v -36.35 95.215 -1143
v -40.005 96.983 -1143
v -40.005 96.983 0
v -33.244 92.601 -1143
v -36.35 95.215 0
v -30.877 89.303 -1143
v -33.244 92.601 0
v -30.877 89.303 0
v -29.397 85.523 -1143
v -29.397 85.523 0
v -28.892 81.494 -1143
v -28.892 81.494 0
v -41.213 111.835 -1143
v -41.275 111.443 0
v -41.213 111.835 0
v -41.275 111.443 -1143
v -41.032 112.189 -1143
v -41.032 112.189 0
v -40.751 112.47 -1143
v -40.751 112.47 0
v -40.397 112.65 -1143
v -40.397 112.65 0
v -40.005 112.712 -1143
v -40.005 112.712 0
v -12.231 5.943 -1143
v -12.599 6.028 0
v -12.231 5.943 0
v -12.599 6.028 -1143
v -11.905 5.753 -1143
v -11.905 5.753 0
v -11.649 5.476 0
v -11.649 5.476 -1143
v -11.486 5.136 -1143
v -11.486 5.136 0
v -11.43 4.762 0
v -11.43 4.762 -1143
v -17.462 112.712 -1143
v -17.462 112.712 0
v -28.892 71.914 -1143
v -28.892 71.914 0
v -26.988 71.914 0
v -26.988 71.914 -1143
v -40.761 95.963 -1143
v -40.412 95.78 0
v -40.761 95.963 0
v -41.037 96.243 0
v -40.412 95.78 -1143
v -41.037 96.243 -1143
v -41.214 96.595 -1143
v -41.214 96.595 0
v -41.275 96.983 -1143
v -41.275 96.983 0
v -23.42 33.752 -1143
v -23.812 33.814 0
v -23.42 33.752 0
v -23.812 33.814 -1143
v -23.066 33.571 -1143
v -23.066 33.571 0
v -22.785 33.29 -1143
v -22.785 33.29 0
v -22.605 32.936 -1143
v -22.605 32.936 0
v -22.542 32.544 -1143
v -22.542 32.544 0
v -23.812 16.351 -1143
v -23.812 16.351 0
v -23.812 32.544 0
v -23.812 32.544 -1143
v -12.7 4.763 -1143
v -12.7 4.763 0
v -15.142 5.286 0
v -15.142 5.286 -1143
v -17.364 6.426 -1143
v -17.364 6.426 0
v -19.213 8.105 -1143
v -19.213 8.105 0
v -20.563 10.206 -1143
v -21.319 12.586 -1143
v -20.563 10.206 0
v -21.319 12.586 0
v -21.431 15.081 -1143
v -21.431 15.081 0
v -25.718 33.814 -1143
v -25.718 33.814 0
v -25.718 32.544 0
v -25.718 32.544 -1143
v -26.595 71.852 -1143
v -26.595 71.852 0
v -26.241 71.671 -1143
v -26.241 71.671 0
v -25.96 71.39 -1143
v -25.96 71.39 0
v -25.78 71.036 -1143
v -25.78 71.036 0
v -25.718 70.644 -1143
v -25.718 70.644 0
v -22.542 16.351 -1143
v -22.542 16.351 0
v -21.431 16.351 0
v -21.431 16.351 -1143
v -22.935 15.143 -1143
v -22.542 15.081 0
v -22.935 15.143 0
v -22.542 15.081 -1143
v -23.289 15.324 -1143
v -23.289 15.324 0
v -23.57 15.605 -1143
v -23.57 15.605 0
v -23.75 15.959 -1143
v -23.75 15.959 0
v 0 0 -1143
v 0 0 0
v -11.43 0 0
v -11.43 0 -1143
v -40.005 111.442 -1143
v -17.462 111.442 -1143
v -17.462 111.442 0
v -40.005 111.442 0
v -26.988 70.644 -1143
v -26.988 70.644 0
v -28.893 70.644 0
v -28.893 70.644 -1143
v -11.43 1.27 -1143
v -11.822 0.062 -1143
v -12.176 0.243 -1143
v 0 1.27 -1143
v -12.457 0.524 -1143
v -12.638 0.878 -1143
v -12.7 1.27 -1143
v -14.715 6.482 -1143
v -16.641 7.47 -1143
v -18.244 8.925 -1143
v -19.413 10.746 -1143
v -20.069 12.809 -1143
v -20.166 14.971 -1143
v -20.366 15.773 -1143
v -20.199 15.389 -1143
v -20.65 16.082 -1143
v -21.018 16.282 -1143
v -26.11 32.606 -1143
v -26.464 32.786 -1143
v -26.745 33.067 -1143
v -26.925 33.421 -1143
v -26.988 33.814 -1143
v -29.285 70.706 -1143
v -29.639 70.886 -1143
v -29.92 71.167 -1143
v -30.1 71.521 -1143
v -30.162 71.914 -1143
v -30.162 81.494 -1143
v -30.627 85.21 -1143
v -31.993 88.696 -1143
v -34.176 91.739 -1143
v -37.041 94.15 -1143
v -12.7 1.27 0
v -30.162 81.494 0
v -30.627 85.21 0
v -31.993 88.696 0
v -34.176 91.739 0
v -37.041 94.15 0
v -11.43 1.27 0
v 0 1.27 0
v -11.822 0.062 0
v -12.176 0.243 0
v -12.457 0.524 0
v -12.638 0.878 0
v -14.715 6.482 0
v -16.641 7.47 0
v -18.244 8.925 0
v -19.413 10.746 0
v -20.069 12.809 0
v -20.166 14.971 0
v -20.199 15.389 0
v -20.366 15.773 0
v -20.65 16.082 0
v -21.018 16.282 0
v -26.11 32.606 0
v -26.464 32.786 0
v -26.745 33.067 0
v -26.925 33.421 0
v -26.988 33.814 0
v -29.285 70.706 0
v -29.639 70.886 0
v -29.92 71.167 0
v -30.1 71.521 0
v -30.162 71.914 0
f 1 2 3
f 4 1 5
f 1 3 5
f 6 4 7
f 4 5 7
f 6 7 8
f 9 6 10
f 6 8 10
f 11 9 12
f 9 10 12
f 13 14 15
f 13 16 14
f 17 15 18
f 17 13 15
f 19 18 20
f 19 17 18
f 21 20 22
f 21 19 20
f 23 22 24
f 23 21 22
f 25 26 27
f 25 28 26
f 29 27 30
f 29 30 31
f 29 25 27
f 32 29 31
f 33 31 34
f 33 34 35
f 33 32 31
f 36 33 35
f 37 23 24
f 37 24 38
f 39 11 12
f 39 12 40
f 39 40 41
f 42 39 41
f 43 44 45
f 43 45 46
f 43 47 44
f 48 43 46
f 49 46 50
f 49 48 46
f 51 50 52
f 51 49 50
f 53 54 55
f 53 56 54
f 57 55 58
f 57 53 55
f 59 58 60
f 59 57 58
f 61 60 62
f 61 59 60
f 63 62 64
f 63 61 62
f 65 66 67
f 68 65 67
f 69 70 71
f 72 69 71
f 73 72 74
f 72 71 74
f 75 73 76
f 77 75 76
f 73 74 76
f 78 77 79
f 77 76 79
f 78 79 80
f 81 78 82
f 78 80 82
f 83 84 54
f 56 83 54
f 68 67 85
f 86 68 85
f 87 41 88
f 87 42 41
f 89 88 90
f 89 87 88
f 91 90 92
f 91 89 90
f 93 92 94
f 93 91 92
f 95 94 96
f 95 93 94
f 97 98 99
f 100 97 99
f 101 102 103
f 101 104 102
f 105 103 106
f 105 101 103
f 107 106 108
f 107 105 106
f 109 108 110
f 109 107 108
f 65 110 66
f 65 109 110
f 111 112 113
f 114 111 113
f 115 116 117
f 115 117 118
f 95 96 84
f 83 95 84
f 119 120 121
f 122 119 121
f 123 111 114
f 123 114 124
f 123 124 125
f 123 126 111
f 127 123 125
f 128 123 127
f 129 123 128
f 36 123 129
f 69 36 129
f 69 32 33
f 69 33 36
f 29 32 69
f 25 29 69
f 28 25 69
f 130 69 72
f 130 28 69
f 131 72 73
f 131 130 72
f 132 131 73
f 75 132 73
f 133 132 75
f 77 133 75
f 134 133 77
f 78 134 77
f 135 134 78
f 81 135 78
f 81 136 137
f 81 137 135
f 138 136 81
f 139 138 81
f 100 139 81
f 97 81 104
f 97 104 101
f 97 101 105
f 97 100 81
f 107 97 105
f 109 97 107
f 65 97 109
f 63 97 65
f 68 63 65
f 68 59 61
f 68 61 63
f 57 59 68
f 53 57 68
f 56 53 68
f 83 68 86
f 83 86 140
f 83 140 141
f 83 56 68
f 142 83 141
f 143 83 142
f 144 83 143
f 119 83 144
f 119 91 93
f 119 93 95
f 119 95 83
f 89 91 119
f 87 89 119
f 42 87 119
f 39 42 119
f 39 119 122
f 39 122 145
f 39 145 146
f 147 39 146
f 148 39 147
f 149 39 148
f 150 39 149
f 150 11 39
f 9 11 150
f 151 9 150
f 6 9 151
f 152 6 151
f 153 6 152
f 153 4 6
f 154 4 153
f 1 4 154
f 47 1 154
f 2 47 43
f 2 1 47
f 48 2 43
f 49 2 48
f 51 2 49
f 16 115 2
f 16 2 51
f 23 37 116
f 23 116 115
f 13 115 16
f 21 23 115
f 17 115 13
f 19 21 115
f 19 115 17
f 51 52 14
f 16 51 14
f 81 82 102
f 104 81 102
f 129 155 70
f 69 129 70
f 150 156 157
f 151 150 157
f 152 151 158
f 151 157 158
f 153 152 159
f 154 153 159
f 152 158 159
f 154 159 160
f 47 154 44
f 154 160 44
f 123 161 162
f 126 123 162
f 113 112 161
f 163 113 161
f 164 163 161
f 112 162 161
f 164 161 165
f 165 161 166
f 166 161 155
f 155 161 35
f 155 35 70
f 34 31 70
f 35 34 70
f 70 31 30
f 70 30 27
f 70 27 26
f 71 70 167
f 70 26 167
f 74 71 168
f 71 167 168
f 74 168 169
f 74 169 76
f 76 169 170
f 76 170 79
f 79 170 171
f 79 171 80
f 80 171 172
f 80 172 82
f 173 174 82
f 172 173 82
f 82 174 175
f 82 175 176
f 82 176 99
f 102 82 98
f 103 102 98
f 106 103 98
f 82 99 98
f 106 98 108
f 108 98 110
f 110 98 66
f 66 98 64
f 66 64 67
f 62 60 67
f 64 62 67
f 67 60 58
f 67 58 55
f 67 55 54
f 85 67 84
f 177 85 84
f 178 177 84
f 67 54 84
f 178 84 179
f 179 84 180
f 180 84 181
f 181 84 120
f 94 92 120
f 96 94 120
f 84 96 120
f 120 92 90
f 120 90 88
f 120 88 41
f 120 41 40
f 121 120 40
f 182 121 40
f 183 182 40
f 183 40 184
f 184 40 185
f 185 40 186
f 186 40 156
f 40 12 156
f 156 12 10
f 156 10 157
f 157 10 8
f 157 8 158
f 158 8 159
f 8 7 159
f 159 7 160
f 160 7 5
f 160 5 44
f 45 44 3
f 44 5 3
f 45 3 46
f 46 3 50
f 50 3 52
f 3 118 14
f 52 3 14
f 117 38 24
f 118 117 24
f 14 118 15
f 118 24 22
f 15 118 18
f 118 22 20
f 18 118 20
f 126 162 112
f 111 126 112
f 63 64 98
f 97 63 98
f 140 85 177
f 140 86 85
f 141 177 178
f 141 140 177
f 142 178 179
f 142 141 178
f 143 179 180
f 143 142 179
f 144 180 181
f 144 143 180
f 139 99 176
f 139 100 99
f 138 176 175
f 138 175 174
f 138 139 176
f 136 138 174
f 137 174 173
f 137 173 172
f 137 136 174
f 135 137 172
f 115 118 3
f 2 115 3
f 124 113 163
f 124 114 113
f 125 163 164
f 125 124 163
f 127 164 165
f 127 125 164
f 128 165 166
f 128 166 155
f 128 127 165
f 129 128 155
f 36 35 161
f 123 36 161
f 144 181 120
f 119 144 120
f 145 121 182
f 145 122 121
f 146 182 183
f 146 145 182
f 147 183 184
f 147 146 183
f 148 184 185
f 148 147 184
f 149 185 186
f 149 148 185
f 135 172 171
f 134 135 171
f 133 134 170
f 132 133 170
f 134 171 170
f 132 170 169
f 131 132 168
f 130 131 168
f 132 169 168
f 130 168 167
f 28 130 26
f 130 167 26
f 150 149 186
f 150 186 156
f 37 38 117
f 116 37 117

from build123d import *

# Parameters (mm, degrees)
EXTRUDE_THIN1_DEPTH = 1143
FILLET1_R           = 1.27


with BuildPart() as part:
    # Sketch1 → Extrude-Thin1 (new body)
    with BuildSketch(Plane.XY):
        with BuildLine():
            Line((0, 0), (-12.7, 0))
            Line((-12.7, 0), (-12.7, 4.7625))
            ThreePointArc((-12.7, 4.7625), (-19.213209814, 8.104687849), (-21.43125, 15.08125))
            Line((-21.43125, 15.08125), (-23.8125, 15.08125))
            Line((-23.8125, 15.08125), (-23.8125, 32.54375))
            Line((-23.8125, 32.54375), (-26.9875, 32.54375))
            Line((-26.9875, 32.54375), (-26.9875, 70.64375))
            Line((-26.9875, 70.64375), (-30.1625, 70.64375))
            Line((-30.1625, 70.64375), (-30.1625, 81.494072169))
            ThreePointArc((-30.1625, 81.494072169), (-33.258387834, 90.648043728), (-41.275, 96.04375))
            Line((-41.275, 96.04375), (-41.275, 112.7125))
            Line((-41.275, 112.7125), (-17.4625, 112.7125))
            Line((-17.4625, 112.7125), (-17.4625, 111.4425))
            Line((-17.4625, 111.4425), (-40.005, 111.4425))
            Line((-40.005, 111.4425), (-40.005, 96.983387034))
            ThreePointArc((-40.005, 96.983387034), (-31.95797777, 91.025684457), (-28.8925, 81.494072169))
            Line((-28.8925, 81.494072169), (-28.8925, 71.91375))
            Line((-28.8925, 71.91375), (-25.7175, 71.91375))
            Line((-25.7175, 71.91375), (-25.7175, 33.81375))
            Line((-25.7175, 33.81375), (-22.5425, 33.81375))
            Line((-22.5425, 33.81375), (-22.5425, 16.35125))
            Line((-22.5425, 16.35125), (-19.926963078, 16.35125))
            ThreePointArc((-19.926963078, 16.35125), (-18.318060907, 9.014168003), (-11.43, 6.018178122))
            Line((-11.43, 6.018178122), (-11.43, 1.27))
            Line((-11.43, 1.27), (0, 1.27))
            Line((0, 1.27), (0, 0))
        make_face()
    extrude(amount=-EXTRUDE_THIN1_DEPTH)

    # Fillet1
    fillet1_edges = [part.edges().sort_by_distance(p)[0] for p in [
        (-25.7175, 71.91375, -571.5),
        (-22.5425, 33.81375, -571.5),
        (-19.926963078, 16.35125, -571.5),
        (-11.43, 6.018178122, -571.5),
        (-12.7, 0, -571.5),
        (-23.8125, 15.08125, -571.5),
        (-26.9875, 32.54375, -571.5),
        (-30.1625, 70.64375, -571.5),
        (-41.275, 96.04375, -571.5),
        (-41.275, 112.7125, -571.5),
    ]]
    fillet(fillet1_edges, radius=FILLET1_R)


solid = part.part
